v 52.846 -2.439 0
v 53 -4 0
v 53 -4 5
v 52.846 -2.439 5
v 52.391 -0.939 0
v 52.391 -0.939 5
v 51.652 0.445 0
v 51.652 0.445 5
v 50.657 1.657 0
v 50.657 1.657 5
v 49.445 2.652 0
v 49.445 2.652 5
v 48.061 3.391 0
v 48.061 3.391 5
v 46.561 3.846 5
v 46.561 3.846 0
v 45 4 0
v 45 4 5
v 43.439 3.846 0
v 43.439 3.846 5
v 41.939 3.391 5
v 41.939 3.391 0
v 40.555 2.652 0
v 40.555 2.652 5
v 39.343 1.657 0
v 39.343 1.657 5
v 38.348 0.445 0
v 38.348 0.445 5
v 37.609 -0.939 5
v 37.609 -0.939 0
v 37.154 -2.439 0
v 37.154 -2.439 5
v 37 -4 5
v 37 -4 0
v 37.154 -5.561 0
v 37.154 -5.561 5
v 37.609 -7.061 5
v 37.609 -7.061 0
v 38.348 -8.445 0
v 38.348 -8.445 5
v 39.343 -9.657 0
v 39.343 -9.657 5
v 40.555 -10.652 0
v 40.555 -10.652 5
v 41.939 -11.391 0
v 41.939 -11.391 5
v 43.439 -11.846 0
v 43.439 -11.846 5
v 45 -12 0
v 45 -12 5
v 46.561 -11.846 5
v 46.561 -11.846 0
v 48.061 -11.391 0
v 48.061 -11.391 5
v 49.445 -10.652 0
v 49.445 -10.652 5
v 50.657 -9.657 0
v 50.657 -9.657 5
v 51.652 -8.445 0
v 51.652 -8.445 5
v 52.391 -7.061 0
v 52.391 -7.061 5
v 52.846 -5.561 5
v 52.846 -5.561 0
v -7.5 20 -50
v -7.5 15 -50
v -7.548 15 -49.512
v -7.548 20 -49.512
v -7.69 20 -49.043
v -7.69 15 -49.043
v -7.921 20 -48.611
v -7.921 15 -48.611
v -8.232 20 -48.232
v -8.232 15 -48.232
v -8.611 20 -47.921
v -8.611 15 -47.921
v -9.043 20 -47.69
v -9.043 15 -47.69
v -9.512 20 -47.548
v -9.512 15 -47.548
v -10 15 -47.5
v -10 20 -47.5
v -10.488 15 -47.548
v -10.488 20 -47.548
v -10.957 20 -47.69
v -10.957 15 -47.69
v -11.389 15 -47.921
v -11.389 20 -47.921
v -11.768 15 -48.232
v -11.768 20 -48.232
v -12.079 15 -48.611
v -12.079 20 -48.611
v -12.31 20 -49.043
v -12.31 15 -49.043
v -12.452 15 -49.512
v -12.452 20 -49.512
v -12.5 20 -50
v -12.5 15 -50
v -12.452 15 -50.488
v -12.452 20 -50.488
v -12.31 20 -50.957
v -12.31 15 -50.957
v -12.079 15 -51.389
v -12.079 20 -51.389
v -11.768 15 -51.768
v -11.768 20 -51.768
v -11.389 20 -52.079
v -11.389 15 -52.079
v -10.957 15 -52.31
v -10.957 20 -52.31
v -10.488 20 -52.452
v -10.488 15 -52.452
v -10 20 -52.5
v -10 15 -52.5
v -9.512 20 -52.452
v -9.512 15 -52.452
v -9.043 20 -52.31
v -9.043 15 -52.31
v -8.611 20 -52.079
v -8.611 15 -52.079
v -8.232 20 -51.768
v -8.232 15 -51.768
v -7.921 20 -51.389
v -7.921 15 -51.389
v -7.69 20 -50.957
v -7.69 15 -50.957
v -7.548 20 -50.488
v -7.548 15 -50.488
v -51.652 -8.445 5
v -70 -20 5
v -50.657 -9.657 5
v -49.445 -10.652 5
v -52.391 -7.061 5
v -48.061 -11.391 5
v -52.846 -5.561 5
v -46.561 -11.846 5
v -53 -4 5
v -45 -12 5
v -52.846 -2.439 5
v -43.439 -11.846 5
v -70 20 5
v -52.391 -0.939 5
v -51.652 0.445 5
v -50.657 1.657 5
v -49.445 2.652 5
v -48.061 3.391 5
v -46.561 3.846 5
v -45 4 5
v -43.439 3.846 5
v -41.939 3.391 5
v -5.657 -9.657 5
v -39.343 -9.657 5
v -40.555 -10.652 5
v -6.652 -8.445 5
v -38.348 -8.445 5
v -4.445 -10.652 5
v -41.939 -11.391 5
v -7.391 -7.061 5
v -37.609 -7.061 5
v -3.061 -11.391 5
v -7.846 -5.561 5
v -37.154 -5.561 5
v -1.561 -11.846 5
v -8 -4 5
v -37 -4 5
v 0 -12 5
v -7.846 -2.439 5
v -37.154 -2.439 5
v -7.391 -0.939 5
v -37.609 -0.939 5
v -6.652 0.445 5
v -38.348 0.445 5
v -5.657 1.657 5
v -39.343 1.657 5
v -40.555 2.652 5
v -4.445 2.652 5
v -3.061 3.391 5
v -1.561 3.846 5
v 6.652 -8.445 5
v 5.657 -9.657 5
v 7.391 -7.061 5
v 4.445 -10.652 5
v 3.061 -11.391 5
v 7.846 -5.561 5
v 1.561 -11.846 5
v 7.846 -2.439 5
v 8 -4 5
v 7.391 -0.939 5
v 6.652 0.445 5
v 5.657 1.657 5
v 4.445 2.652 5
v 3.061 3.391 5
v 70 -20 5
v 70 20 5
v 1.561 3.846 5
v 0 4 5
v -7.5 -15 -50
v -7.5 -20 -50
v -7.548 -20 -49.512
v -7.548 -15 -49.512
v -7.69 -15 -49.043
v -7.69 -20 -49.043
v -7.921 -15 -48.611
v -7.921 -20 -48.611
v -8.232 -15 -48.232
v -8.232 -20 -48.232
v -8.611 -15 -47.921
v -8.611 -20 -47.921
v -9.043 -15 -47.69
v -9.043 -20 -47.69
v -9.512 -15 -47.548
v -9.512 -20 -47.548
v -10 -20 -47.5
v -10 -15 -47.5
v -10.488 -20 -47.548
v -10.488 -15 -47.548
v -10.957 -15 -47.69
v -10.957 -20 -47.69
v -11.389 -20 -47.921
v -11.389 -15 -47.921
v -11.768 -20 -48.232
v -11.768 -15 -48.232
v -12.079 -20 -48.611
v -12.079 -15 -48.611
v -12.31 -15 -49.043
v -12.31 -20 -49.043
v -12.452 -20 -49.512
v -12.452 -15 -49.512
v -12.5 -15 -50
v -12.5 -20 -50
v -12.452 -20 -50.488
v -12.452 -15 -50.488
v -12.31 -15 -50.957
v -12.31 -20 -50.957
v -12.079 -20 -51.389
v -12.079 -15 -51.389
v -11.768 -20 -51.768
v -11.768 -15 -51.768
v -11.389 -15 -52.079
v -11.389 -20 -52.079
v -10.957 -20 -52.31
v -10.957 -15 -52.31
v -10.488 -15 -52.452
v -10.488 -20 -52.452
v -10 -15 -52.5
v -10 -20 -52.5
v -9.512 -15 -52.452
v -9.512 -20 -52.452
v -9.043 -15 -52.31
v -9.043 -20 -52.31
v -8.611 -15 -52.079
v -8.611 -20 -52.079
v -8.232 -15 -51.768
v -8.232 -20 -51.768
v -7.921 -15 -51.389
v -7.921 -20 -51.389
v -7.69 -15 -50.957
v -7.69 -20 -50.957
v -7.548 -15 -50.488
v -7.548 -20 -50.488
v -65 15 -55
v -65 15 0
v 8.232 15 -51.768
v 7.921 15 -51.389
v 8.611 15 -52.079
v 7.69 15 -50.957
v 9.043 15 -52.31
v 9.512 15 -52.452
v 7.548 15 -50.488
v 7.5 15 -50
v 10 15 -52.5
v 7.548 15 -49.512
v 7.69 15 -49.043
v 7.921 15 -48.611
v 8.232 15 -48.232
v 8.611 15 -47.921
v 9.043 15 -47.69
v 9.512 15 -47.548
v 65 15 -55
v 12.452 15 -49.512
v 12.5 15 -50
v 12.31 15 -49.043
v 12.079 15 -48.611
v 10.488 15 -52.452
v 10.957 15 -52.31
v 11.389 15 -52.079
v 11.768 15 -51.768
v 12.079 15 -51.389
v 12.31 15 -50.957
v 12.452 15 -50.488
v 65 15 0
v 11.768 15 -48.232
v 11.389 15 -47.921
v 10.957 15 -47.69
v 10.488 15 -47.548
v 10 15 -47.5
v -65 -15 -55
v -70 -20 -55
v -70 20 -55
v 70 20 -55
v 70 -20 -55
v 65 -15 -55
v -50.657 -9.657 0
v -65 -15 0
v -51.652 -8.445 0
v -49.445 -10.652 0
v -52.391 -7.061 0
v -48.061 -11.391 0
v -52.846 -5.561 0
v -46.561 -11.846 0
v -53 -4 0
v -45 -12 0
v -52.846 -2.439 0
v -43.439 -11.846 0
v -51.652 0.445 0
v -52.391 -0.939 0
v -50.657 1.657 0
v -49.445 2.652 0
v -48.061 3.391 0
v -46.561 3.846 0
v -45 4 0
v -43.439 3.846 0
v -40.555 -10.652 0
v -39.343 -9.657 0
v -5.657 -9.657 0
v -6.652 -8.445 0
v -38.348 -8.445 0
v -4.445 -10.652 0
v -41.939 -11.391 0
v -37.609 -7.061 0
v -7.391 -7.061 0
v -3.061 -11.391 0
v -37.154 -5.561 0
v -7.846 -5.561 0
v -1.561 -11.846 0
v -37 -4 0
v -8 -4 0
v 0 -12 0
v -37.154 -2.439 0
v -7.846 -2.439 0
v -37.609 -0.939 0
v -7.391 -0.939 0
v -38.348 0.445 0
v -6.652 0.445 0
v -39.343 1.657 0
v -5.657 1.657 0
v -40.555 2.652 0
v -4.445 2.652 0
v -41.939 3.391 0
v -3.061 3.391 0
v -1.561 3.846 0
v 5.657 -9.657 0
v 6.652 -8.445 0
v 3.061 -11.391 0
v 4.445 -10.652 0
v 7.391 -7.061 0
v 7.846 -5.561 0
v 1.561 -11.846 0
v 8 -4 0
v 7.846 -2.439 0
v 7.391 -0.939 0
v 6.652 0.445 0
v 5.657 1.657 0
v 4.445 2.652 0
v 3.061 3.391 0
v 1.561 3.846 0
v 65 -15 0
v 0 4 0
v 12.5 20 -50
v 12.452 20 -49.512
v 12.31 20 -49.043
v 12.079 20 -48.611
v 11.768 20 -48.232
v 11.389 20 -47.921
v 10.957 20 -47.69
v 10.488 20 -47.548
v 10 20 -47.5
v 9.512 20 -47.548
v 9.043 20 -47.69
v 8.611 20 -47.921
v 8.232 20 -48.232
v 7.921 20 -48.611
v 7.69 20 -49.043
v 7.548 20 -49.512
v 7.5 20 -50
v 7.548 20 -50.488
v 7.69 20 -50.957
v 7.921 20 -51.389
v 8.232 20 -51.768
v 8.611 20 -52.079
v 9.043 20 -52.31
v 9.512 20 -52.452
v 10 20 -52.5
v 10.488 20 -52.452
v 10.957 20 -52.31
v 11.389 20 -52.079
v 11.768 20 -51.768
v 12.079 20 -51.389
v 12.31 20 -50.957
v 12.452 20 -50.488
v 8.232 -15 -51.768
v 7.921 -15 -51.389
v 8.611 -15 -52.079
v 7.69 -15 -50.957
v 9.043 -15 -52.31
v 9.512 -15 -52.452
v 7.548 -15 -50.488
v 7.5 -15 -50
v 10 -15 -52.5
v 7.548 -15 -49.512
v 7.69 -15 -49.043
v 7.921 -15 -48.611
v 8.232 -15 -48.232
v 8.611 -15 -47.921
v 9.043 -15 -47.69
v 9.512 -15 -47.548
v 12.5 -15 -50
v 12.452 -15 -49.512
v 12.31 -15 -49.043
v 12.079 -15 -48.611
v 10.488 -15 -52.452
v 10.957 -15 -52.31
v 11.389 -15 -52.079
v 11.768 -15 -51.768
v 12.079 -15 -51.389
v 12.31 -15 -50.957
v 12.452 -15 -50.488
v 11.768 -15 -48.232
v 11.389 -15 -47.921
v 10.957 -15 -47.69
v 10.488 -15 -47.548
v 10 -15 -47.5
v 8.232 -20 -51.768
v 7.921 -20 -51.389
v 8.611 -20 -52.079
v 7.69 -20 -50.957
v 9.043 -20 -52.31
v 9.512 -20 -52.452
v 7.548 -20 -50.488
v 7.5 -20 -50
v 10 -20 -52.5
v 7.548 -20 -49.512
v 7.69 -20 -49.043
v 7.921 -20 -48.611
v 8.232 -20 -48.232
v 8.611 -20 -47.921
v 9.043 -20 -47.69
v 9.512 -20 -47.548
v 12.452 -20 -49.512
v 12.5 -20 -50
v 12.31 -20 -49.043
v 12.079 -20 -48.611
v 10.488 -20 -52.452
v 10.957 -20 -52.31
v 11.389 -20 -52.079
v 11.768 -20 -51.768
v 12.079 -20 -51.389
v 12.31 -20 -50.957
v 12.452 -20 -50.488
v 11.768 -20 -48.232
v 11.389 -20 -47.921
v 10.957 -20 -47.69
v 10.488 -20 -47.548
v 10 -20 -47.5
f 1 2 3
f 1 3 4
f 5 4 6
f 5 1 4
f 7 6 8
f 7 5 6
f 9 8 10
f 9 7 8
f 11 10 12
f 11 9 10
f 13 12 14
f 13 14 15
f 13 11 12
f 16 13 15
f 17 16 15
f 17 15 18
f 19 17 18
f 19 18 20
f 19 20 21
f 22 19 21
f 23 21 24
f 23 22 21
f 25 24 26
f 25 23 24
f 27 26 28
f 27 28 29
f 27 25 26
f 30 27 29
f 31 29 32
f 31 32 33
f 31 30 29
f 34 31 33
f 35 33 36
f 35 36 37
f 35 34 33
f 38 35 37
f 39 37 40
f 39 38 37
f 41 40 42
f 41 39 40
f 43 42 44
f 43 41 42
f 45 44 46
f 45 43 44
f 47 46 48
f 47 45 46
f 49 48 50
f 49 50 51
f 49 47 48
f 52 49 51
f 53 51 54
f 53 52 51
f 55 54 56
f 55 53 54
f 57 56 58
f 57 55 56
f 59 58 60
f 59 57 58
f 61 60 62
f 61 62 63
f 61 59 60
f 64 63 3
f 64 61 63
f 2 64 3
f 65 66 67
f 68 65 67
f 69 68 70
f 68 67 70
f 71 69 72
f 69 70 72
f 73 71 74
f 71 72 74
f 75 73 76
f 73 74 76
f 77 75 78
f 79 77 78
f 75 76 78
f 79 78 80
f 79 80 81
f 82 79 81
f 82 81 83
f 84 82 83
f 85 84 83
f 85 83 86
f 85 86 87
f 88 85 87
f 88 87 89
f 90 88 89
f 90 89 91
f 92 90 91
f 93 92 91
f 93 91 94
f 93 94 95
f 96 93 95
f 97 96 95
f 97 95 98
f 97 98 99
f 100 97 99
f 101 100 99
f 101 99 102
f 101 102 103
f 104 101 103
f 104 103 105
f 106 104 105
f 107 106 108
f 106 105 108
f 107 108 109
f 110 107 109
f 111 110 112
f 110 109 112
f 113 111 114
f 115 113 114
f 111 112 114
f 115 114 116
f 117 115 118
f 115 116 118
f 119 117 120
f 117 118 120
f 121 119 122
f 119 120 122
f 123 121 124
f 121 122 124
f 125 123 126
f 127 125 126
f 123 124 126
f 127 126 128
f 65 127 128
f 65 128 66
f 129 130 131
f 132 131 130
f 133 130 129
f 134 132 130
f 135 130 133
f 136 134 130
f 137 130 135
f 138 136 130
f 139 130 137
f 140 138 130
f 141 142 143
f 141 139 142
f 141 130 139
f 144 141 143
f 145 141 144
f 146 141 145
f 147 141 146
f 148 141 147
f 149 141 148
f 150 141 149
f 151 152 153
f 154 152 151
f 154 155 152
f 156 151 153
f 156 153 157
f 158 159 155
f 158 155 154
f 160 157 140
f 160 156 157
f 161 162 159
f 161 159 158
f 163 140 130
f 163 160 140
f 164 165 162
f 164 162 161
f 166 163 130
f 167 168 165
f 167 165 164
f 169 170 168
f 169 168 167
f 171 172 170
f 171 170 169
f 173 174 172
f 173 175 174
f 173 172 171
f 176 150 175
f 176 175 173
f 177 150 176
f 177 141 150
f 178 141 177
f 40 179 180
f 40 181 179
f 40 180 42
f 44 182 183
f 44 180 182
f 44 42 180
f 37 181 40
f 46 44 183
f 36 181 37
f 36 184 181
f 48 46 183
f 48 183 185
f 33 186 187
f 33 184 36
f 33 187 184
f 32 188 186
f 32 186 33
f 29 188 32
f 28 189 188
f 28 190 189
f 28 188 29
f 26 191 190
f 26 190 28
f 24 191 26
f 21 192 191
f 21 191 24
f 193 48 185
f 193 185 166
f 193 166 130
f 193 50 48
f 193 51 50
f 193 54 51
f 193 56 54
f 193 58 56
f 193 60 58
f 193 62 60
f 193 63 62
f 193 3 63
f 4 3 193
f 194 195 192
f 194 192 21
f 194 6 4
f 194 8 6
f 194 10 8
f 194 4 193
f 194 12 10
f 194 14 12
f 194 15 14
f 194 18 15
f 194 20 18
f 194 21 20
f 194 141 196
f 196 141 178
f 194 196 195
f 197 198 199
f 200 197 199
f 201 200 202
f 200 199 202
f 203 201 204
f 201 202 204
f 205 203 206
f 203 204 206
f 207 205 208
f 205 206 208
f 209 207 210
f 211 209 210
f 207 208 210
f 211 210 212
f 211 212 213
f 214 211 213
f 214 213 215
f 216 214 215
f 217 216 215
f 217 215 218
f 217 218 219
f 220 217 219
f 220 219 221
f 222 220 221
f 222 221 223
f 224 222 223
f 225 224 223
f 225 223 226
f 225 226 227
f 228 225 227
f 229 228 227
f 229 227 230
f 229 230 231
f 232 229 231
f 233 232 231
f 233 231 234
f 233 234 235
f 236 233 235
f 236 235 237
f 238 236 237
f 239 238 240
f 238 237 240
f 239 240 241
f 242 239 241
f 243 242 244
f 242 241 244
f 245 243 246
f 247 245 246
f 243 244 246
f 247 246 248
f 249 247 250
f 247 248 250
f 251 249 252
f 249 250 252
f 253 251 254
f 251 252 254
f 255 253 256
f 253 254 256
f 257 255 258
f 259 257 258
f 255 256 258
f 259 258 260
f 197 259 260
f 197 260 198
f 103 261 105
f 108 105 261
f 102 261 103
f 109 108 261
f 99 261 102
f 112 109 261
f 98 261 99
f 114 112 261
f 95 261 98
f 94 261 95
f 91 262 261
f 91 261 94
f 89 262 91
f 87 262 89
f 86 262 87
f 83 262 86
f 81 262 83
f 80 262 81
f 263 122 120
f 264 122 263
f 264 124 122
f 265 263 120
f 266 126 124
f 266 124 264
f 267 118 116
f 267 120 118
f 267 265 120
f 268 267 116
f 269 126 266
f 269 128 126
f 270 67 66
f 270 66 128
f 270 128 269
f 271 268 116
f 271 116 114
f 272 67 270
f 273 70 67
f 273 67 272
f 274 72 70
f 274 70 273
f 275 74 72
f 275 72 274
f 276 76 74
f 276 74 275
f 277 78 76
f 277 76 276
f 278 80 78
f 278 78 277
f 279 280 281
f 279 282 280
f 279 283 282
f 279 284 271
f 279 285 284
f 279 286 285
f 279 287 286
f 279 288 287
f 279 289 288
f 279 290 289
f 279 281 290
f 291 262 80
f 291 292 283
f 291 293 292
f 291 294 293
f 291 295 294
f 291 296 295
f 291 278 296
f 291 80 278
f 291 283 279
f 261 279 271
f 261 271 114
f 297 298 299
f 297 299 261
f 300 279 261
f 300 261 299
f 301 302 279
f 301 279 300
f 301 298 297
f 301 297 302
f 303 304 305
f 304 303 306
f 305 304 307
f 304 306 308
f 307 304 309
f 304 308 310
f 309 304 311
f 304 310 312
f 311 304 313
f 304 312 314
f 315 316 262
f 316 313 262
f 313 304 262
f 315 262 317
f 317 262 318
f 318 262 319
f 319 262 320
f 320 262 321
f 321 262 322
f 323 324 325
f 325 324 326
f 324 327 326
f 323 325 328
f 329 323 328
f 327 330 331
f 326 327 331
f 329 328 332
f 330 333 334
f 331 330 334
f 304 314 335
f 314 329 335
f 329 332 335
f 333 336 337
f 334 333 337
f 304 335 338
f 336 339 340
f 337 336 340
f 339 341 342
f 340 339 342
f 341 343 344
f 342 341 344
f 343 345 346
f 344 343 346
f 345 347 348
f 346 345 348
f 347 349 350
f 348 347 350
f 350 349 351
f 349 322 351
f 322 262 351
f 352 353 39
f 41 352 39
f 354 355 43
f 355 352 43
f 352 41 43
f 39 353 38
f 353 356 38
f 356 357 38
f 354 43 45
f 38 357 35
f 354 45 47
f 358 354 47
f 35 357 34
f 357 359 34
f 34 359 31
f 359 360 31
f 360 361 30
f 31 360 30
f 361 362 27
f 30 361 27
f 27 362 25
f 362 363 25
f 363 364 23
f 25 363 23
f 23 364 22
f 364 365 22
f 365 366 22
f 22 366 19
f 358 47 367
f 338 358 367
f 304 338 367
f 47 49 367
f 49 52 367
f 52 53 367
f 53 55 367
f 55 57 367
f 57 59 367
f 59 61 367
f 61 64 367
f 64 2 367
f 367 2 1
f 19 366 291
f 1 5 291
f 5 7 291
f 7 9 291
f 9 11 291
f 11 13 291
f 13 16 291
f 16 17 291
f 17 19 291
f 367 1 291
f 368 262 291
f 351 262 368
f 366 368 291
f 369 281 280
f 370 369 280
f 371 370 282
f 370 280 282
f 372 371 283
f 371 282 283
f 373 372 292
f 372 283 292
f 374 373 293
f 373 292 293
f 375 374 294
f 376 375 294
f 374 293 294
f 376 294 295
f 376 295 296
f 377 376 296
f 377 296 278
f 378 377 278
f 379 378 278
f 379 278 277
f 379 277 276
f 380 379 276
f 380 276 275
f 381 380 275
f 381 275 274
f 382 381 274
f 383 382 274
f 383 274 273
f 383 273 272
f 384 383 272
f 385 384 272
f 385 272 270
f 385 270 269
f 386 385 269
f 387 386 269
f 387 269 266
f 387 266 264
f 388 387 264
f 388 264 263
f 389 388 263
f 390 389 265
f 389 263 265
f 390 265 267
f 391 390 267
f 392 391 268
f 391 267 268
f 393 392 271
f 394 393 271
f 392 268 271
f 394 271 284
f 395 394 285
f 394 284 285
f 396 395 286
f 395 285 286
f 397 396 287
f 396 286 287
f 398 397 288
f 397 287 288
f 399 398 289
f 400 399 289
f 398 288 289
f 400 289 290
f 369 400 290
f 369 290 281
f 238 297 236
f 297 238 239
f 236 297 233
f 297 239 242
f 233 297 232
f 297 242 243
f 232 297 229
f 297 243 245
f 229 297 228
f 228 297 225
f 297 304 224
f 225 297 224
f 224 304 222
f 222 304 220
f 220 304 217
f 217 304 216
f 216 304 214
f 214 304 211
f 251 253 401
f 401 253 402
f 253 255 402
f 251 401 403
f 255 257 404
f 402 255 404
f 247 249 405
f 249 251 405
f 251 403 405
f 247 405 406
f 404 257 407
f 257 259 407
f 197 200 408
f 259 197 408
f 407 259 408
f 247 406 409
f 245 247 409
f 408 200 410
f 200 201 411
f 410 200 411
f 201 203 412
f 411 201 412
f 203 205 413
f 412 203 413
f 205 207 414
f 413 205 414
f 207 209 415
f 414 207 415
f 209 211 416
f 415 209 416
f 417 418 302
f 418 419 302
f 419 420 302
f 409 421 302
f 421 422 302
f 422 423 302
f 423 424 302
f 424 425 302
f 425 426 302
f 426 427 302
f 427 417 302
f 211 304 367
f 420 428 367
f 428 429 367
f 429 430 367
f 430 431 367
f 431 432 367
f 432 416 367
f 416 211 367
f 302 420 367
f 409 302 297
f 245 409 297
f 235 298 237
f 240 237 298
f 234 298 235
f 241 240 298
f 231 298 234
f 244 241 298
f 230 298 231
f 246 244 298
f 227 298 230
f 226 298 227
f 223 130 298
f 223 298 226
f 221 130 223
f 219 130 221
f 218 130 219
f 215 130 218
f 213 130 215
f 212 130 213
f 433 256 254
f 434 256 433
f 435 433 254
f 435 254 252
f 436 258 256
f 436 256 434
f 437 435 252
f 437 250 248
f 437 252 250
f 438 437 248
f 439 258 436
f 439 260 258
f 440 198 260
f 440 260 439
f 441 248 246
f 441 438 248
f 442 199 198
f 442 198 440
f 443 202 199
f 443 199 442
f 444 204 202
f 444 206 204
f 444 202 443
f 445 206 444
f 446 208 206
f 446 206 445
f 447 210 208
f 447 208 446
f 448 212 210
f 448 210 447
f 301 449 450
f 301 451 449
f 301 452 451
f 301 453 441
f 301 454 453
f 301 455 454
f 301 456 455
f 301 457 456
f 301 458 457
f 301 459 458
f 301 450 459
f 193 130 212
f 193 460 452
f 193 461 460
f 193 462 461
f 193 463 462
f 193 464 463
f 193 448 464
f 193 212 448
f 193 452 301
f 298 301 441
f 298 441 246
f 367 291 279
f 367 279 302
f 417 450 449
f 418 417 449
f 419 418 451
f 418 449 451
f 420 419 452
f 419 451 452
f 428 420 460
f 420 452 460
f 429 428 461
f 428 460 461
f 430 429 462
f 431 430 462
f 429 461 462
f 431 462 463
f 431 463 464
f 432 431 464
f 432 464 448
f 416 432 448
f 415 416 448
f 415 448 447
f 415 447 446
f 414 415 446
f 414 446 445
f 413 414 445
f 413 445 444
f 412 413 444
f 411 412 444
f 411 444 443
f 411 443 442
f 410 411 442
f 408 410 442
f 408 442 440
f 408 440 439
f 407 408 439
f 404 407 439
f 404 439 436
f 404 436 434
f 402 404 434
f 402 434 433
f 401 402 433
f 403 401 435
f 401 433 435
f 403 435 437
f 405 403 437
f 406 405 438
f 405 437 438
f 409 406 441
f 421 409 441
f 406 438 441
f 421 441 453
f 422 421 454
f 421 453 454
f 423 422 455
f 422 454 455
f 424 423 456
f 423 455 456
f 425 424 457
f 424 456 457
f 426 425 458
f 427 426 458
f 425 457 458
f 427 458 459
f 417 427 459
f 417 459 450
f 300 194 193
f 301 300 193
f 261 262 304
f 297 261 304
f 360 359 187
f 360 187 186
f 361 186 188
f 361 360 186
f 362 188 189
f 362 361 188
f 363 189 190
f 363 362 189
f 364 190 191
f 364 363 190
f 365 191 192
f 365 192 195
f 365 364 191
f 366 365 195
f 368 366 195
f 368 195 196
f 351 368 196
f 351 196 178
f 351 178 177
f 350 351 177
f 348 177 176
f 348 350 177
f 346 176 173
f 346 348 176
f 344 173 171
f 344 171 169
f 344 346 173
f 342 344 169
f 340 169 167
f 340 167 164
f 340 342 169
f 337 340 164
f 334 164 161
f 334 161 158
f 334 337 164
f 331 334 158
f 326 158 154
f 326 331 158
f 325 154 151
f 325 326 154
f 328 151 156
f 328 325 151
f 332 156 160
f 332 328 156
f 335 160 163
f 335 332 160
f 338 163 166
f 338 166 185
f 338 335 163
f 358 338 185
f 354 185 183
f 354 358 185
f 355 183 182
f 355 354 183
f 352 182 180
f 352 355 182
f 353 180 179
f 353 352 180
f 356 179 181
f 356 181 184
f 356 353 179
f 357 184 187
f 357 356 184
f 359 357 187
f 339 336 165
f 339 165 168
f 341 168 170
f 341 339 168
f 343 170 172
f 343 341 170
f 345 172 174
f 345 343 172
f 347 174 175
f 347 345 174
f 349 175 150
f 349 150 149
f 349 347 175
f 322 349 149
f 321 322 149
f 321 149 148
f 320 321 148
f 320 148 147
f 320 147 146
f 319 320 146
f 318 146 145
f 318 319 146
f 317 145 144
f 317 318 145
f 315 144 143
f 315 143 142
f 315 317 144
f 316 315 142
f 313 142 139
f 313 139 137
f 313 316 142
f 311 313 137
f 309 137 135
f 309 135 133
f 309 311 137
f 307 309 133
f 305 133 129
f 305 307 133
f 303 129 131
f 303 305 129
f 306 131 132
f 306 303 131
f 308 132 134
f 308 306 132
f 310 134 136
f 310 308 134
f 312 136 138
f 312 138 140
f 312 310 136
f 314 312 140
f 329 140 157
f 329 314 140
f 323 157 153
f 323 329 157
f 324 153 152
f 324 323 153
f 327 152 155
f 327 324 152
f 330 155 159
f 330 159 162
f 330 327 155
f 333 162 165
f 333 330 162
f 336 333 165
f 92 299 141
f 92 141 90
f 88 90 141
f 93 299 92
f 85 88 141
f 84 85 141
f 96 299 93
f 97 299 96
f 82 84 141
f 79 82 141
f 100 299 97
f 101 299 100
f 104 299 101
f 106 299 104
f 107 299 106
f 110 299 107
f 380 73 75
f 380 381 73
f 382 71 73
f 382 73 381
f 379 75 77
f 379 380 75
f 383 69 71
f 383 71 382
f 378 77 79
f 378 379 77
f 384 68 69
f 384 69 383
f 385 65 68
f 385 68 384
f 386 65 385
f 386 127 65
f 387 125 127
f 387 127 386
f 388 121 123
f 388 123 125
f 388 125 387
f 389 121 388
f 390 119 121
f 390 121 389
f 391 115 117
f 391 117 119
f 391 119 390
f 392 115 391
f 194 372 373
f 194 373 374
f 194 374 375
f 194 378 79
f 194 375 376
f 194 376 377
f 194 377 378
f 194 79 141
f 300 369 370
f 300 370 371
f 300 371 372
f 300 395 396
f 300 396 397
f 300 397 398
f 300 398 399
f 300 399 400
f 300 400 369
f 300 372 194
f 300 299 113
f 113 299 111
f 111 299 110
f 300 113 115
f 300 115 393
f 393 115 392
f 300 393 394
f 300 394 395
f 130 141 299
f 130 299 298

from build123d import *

# Parameters (mm, degrees)
F0_W     = 140
F0_H     = 40
F0_R     = 8
F1_DEPTH = 5
F2_W     = 140
F2_H     = 5
F3_DEPTH = 55
F4_W     = 5
F4_H     = 30
F5_DEPTH = 55
F6_R     = 2.5
F7_DEPTH = 60


with BuildPart() as f1:
    # F0 (on Top) → F1 (new body)
    with BuildSketch(Plane.XY):
        Rectangle(F0_W, F0_H)
        with Locations((-45, -4)):
            Circle(F0_R, mode=Mode.SUBTRACT)
        with Locations((0, -4)):
            Circle(F0_R, mode=Mode.SUBTRACT)
        with Locations((45, -4)):
            Circle(F0_R, mode=Mode.SUBTRACT)
    extrude(amount=F1_DEPTH)

    # F2 (on face) → F3 (join)
    with BuildSketch(Plane(origin=(0, 0, 0), x_dir=(1, 0, 0), z_dir=(0, 0, -1))):
        with Locations((0, 17.5)):
            Rectangle(F2_W, F2_H)
        with Locations((0, -17.5)):
            Rectangle(F2_W, F2_H)
    extrude(amount=F3_DEPTH)

    # F4 (on face) → F5 (join)
    with BuildSketch(Plane(origin=(0, 0, 0), x_dir=(1, 0, 0), z_dir=(0, 0, -1))):
        with Locations((-67.5, 0)):
            Rectangle(F4_W, F4_H)
        with Locations((67.5, 0)):
            Rectangle(F4_W, F4_H)
    extrude(amount=F5_DEPTH)

    # F6 (on face) → F7 (cut)
    with BuildSketch(Plane.XZ.offset(20)):
        with Locations((10, -50)):
            Circle(F6_R)
        with Locations((-10, -50)):
            Circle(F6_R)
    extrude(amount=-F7_DEPTH, mode=Mode.SUBTRACT)


solid = f1.part
